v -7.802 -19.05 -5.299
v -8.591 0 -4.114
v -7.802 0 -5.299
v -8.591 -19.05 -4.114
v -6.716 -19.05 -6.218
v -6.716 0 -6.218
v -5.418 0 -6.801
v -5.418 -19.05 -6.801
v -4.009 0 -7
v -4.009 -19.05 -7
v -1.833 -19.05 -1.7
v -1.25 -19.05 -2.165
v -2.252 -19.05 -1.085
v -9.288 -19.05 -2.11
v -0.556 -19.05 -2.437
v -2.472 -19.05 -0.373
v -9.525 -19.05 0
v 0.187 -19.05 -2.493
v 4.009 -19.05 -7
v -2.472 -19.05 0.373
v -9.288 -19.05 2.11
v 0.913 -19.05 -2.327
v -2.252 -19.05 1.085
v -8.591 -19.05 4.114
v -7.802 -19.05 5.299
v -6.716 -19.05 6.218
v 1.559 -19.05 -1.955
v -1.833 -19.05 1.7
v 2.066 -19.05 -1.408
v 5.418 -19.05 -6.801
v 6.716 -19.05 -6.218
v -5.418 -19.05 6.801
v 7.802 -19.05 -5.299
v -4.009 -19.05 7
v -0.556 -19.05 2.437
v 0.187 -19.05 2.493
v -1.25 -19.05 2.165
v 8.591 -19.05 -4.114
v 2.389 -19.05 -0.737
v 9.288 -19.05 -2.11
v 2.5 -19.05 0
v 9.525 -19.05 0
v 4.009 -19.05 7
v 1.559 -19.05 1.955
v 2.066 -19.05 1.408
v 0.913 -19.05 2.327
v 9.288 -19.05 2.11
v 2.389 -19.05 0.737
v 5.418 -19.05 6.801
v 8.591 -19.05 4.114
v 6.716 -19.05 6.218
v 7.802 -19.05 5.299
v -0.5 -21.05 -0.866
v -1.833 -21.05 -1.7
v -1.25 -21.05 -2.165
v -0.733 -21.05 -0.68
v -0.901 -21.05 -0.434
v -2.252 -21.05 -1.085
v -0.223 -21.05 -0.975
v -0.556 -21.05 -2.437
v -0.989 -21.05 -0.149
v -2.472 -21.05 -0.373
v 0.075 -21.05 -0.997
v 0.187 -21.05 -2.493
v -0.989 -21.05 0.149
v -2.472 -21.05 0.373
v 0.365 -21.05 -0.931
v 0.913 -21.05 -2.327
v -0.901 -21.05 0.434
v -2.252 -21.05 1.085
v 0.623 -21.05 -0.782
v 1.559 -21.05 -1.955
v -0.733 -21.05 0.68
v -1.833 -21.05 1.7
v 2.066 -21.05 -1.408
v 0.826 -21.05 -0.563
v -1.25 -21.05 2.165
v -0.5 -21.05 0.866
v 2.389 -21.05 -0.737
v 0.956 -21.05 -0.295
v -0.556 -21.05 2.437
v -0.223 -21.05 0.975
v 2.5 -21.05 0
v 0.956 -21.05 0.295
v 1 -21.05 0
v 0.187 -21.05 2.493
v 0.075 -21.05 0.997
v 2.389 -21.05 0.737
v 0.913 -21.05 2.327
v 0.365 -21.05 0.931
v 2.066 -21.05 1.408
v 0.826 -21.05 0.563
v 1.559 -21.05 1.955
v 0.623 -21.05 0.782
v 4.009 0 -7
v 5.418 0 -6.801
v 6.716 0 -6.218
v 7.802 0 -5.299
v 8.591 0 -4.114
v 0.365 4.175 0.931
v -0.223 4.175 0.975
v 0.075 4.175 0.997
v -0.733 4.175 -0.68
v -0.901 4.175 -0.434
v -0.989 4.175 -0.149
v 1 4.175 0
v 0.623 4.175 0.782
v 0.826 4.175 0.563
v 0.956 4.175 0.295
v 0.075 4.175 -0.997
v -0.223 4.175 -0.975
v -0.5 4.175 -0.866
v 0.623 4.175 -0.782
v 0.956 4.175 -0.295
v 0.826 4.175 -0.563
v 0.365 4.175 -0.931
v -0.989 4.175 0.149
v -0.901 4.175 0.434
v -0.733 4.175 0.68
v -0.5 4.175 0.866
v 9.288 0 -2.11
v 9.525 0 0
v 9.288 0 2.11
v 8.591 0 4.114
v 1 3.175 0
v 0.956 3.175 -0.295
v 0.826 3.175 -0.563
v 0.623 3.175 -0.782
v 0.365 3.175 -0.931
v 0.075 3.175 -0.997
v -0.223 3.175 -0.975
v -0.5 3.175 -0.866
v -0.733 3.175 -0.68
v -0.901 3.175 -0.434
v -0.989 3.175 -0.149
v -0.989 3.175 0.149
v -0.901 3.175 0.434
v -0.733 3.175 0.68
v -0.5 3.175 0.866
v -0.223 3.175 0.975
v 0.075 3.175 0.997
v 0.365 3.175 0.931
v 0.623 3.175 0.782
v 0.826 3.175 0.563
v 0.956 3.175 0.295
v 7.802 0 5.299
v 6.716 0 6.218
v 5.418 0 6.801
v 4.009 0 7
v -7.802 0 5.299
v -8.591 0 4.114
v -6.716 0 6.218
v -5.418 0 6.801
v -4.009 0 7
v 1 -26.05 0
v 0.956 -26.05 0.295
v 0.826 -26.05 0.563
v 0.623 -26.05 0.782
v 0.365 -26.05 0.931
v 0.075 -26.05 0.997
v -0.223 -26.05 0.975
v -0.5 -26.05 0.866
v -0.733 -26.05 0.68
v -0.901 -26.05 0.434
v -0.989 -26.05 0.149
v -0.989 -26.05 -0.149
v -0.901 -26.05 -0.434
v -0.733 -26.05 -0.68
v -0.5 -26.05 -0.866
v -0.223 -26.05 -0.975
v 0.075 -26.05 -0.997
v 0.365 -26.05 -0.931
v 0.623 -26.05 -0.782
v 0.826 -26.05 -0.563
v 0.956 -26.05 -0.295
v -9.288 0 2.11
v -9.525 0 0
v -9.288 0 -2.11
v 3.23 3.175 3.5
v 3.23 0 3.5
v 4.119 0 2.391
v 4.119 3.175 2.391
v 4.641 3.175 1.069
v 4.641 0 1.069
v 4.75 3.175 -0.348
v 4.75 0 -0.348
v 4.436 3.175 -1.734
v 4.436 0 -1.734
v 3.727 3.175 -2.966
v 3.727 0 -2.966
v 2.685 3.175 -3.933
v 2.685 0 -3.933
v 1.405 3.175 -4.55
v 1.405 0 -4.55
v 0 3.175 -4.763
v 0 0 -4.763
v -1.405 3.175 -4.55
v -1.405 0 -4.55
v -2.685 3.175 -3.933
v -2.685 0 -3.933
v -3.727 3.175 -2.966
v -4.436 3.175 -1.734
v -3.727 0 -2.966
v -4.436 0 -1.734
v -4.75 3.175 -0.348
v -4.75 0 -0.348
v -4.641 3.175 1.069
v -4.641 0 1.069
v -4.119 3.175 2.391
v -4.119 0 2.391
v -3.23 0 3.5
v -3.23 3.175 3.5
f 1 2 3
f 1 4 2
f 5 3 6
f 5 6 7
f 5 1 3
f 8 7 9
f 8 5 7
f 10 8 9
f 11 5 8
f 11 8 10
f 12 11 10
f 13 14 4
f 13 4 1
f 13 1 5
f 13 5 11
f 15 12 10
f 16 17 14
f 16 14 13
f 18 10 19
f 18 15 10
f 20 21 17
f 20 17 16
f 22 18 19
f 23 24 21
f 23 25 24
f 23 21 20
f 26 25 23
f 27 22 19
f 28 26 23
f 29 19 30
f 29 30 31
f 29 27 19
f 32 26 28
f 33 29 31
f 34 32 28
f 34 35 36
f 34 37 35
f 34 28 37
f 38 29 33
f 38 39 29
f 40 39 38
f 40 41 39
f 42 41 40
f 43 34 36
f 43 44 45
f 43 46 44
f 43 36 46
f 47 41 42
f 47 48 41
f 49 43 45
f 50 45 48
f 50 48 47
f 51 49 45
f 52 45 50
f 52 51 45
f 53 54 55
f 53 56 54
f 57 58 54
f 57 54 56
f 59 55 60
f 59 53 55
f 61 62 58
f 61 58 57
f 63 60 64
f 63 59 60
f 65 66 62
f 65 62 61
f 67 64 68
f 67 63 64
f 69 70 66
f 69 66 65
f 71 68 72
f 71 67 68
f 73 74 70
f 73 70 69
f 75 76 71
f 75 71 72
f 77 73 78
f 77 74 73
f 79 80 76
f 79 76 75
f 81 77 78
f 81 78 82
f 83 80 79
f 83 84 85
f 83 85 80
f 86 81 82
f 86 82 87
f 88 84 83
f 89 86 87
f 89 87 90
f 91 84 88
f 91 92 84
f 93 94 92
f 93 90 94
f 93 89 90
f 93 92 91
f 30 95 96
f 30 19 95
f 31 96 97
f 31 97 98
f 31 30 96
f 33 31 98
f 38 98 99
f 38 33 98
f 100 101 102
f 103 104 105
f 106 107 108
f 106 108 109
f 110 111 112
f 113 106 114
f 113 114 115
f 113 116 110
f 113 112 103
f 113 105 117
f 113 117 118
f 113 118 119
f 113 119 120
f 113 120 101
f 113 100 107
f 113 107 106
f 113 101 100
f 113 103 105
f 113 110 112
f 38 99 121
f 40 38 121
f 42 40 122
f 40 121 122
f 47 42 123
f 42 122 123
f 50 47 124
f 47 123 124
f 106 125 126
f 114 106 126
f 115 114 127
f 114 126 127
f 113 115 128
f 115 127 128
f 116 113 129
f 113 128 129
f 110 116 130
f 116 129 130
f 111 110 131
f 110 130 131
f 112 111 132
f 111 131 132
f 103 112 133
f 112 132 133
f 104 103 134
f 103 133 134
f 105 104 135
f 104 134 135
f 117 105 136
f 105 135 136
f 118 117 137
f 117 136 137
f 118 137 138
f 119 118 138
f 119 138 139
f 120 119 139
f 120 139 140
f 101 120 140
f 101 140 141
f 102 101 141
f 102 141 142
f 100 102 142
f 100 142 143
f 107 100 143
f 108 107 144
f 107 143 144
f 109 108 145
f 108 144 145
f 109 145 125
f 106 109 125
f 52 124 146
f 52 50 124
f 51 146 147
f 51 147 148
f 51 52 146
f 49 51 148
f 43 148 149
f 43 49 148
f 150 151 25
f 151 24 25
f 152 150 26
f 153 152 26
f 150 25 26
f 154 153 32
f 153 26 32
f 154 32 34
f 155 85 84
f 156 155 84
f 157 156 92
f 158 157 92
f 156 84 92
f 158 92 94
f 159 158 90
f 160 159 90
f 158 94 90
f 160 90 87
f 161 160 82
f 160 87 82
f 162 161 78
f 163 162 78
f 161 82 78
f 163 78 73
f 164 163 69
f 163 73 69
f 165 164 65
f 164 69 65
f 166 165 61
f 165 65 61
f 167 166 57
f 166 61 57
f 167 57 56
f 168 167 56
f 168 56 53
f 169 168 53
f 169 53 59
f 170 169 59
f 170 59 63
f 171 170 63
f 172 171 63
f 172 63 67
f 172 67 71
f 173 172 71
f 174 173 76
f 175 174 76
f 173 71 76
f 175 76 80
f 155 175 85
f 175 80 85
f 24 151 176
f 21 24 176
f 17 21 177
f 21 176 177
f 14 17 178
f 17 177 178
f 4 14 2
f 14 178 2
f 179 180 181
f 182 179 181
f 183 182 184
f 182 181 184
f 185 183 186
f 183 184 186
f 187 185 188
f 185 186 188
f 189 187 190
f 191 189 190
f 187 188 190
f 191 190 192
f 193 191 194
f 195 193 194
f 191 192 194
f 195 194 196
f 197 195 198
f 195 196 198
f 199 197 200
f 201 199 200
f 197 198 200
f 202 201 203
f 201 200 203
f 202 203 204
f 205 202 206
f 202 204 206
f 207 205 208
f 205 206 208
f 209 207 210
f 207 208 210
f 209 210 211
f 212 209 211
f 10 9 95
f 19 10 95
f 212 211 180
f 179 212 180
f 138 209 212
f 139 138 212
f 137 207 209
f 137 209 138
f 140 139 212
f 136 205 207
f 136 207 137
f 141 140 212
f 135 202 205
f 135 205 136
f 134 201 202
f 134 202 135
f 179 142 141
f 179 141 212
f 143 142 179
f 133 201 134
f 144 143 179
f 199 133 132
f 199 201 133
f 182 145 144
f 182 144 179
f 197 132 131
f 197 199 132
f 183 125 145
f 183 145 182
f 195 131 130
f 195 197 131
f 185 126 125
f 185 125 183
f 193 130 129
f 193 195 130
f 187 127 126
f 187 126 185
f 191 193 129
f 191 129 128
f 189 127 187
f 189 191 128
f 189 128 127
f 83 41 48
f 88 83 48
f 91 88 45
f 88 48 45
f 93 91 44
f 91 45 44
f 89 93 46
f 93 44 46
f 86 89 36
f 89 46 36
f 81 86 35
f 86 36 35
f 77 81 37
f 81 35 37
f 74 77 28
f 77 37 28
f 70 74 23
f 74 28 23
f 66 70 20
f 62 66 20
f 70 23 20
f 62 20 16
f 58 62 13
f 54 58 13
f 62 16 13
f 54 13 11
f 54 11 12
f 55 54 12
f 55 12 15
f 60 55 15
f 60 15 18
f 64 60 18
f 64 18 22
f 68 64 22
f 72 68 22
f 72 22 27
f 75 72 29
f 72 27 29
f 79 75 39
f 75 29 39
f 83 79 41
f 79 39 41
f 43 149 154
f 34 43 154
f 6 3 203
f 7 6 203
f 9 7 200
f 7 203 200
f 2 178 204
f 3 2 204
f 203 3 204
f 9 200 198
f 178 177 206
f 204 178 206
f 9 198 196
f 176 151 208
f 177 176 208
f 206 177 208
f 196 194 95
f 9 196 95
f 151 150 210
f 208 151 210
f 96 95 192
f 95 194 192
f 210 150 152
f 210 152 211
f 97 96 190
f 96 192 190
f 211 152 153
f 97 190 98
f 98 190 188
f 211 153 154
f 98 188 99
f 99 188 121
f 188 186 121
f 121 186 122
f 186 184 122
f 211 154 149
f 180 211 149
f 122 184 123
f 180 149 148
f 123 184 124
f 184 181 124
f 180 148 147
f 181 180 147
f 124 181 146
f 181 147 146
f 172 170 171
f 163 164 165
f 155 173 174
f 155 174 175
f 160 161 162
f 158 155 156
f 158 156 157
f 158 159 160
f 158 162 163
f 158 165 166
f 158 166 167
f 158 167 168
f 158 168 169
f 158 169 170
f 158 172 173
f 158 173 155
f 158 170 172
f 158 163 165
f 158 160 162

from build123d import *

# Parameters (mm, degrees)
F1_DEPTH  = 19.05
F2_R      = 5.08
F3_R      = 2.5
F4_DEPTH  = 2
F5_R      = 1
F6_DEPTH  = 5
F8_DEPTH  = 3.175
F9_R      = 1
F10_DEPTH = 1
F12_ANGLE = 90


# Not quite as in the source:
# - a length typed as a fraction of an inch, garbled in the dataset ("3 / 203.2 mm" for 3/8 in), is restored


with BuildPart() as f1:
    # F0 (on Top) → F1 (new body)
    with BuildSketch(Plane.XY):
        with BuildLine():
            Line((0, 7), (-6.4595375221, 7))
            ThreePointArc((-6.4595375221, 7), (-9.525, 0), (-6.4595375221, -7))
            Line((-6.4595375221, -7), (6.4595375221, -7))
            ThreePointArc((6.4595375221, -7), (9.525, 0), (6.4595375221, 7))
            Line((6.4595375221, 7), (0, 7))
        make_face()
    extrude(amount=F1_DEPTH)

    # F2
    f2_edges = [f1.edges().sort_by_distance(p)[0] for p in [
        (-6.459538, -7, 9.525),
        (6.459538, -7, 9.525),
        (-6.459538, 7, 9.525),
        (6.459538, 7, 9.525),
    ]]
    fillet(f2_edges, radius=F2_R)

    # F3 (on face) → F4 (join)
    with BuildSketch(Plane.XY.offset(19.05)):
        Circle(F3_R)
    extrude(amount=F4_DEPTH)

    # F5 (on face) → F6 (join)
    with BuildSketch(Plane.XY.offset(21.05)):
        Circle(F5_R)
    extrude(amount=F6_DEPTH)

    # F7 (on face) → F8 (join)
    with BuildSketch(Plane(origin=(0, 0, 0), x_dir=(1, 0, 0), z_dir=(0, 0, -1))):
        with BuildLine():
            Line((0, -3.5), (3.2297687611, -3.5))
            ThreePointArc((3.2297687611, -3.5), (0, 4.7625), (-3.2297687611, -3.5))
            Line((-3.2297687611, -3.5), (0, -3.5))
        make_face()
    extrude(amount=F8_DEPTH)

    # F9 (on face) → F10 (join)
    with BuildSketch(Plane(origin=(0, 0, -3.175), x_dir=(1, 0, 0), z_dir=(0, 0, -1))):
        Circle(F9_R)
    extrude(amount=F10_DEPTH)


with BuildPart() as f1_1:
    # F12: moved
    add(f1.part.rotate(Axis((1.8931087106, 0, 0), (1, 0, 0)), F12_ANGLE))


solid = f1_1.part
